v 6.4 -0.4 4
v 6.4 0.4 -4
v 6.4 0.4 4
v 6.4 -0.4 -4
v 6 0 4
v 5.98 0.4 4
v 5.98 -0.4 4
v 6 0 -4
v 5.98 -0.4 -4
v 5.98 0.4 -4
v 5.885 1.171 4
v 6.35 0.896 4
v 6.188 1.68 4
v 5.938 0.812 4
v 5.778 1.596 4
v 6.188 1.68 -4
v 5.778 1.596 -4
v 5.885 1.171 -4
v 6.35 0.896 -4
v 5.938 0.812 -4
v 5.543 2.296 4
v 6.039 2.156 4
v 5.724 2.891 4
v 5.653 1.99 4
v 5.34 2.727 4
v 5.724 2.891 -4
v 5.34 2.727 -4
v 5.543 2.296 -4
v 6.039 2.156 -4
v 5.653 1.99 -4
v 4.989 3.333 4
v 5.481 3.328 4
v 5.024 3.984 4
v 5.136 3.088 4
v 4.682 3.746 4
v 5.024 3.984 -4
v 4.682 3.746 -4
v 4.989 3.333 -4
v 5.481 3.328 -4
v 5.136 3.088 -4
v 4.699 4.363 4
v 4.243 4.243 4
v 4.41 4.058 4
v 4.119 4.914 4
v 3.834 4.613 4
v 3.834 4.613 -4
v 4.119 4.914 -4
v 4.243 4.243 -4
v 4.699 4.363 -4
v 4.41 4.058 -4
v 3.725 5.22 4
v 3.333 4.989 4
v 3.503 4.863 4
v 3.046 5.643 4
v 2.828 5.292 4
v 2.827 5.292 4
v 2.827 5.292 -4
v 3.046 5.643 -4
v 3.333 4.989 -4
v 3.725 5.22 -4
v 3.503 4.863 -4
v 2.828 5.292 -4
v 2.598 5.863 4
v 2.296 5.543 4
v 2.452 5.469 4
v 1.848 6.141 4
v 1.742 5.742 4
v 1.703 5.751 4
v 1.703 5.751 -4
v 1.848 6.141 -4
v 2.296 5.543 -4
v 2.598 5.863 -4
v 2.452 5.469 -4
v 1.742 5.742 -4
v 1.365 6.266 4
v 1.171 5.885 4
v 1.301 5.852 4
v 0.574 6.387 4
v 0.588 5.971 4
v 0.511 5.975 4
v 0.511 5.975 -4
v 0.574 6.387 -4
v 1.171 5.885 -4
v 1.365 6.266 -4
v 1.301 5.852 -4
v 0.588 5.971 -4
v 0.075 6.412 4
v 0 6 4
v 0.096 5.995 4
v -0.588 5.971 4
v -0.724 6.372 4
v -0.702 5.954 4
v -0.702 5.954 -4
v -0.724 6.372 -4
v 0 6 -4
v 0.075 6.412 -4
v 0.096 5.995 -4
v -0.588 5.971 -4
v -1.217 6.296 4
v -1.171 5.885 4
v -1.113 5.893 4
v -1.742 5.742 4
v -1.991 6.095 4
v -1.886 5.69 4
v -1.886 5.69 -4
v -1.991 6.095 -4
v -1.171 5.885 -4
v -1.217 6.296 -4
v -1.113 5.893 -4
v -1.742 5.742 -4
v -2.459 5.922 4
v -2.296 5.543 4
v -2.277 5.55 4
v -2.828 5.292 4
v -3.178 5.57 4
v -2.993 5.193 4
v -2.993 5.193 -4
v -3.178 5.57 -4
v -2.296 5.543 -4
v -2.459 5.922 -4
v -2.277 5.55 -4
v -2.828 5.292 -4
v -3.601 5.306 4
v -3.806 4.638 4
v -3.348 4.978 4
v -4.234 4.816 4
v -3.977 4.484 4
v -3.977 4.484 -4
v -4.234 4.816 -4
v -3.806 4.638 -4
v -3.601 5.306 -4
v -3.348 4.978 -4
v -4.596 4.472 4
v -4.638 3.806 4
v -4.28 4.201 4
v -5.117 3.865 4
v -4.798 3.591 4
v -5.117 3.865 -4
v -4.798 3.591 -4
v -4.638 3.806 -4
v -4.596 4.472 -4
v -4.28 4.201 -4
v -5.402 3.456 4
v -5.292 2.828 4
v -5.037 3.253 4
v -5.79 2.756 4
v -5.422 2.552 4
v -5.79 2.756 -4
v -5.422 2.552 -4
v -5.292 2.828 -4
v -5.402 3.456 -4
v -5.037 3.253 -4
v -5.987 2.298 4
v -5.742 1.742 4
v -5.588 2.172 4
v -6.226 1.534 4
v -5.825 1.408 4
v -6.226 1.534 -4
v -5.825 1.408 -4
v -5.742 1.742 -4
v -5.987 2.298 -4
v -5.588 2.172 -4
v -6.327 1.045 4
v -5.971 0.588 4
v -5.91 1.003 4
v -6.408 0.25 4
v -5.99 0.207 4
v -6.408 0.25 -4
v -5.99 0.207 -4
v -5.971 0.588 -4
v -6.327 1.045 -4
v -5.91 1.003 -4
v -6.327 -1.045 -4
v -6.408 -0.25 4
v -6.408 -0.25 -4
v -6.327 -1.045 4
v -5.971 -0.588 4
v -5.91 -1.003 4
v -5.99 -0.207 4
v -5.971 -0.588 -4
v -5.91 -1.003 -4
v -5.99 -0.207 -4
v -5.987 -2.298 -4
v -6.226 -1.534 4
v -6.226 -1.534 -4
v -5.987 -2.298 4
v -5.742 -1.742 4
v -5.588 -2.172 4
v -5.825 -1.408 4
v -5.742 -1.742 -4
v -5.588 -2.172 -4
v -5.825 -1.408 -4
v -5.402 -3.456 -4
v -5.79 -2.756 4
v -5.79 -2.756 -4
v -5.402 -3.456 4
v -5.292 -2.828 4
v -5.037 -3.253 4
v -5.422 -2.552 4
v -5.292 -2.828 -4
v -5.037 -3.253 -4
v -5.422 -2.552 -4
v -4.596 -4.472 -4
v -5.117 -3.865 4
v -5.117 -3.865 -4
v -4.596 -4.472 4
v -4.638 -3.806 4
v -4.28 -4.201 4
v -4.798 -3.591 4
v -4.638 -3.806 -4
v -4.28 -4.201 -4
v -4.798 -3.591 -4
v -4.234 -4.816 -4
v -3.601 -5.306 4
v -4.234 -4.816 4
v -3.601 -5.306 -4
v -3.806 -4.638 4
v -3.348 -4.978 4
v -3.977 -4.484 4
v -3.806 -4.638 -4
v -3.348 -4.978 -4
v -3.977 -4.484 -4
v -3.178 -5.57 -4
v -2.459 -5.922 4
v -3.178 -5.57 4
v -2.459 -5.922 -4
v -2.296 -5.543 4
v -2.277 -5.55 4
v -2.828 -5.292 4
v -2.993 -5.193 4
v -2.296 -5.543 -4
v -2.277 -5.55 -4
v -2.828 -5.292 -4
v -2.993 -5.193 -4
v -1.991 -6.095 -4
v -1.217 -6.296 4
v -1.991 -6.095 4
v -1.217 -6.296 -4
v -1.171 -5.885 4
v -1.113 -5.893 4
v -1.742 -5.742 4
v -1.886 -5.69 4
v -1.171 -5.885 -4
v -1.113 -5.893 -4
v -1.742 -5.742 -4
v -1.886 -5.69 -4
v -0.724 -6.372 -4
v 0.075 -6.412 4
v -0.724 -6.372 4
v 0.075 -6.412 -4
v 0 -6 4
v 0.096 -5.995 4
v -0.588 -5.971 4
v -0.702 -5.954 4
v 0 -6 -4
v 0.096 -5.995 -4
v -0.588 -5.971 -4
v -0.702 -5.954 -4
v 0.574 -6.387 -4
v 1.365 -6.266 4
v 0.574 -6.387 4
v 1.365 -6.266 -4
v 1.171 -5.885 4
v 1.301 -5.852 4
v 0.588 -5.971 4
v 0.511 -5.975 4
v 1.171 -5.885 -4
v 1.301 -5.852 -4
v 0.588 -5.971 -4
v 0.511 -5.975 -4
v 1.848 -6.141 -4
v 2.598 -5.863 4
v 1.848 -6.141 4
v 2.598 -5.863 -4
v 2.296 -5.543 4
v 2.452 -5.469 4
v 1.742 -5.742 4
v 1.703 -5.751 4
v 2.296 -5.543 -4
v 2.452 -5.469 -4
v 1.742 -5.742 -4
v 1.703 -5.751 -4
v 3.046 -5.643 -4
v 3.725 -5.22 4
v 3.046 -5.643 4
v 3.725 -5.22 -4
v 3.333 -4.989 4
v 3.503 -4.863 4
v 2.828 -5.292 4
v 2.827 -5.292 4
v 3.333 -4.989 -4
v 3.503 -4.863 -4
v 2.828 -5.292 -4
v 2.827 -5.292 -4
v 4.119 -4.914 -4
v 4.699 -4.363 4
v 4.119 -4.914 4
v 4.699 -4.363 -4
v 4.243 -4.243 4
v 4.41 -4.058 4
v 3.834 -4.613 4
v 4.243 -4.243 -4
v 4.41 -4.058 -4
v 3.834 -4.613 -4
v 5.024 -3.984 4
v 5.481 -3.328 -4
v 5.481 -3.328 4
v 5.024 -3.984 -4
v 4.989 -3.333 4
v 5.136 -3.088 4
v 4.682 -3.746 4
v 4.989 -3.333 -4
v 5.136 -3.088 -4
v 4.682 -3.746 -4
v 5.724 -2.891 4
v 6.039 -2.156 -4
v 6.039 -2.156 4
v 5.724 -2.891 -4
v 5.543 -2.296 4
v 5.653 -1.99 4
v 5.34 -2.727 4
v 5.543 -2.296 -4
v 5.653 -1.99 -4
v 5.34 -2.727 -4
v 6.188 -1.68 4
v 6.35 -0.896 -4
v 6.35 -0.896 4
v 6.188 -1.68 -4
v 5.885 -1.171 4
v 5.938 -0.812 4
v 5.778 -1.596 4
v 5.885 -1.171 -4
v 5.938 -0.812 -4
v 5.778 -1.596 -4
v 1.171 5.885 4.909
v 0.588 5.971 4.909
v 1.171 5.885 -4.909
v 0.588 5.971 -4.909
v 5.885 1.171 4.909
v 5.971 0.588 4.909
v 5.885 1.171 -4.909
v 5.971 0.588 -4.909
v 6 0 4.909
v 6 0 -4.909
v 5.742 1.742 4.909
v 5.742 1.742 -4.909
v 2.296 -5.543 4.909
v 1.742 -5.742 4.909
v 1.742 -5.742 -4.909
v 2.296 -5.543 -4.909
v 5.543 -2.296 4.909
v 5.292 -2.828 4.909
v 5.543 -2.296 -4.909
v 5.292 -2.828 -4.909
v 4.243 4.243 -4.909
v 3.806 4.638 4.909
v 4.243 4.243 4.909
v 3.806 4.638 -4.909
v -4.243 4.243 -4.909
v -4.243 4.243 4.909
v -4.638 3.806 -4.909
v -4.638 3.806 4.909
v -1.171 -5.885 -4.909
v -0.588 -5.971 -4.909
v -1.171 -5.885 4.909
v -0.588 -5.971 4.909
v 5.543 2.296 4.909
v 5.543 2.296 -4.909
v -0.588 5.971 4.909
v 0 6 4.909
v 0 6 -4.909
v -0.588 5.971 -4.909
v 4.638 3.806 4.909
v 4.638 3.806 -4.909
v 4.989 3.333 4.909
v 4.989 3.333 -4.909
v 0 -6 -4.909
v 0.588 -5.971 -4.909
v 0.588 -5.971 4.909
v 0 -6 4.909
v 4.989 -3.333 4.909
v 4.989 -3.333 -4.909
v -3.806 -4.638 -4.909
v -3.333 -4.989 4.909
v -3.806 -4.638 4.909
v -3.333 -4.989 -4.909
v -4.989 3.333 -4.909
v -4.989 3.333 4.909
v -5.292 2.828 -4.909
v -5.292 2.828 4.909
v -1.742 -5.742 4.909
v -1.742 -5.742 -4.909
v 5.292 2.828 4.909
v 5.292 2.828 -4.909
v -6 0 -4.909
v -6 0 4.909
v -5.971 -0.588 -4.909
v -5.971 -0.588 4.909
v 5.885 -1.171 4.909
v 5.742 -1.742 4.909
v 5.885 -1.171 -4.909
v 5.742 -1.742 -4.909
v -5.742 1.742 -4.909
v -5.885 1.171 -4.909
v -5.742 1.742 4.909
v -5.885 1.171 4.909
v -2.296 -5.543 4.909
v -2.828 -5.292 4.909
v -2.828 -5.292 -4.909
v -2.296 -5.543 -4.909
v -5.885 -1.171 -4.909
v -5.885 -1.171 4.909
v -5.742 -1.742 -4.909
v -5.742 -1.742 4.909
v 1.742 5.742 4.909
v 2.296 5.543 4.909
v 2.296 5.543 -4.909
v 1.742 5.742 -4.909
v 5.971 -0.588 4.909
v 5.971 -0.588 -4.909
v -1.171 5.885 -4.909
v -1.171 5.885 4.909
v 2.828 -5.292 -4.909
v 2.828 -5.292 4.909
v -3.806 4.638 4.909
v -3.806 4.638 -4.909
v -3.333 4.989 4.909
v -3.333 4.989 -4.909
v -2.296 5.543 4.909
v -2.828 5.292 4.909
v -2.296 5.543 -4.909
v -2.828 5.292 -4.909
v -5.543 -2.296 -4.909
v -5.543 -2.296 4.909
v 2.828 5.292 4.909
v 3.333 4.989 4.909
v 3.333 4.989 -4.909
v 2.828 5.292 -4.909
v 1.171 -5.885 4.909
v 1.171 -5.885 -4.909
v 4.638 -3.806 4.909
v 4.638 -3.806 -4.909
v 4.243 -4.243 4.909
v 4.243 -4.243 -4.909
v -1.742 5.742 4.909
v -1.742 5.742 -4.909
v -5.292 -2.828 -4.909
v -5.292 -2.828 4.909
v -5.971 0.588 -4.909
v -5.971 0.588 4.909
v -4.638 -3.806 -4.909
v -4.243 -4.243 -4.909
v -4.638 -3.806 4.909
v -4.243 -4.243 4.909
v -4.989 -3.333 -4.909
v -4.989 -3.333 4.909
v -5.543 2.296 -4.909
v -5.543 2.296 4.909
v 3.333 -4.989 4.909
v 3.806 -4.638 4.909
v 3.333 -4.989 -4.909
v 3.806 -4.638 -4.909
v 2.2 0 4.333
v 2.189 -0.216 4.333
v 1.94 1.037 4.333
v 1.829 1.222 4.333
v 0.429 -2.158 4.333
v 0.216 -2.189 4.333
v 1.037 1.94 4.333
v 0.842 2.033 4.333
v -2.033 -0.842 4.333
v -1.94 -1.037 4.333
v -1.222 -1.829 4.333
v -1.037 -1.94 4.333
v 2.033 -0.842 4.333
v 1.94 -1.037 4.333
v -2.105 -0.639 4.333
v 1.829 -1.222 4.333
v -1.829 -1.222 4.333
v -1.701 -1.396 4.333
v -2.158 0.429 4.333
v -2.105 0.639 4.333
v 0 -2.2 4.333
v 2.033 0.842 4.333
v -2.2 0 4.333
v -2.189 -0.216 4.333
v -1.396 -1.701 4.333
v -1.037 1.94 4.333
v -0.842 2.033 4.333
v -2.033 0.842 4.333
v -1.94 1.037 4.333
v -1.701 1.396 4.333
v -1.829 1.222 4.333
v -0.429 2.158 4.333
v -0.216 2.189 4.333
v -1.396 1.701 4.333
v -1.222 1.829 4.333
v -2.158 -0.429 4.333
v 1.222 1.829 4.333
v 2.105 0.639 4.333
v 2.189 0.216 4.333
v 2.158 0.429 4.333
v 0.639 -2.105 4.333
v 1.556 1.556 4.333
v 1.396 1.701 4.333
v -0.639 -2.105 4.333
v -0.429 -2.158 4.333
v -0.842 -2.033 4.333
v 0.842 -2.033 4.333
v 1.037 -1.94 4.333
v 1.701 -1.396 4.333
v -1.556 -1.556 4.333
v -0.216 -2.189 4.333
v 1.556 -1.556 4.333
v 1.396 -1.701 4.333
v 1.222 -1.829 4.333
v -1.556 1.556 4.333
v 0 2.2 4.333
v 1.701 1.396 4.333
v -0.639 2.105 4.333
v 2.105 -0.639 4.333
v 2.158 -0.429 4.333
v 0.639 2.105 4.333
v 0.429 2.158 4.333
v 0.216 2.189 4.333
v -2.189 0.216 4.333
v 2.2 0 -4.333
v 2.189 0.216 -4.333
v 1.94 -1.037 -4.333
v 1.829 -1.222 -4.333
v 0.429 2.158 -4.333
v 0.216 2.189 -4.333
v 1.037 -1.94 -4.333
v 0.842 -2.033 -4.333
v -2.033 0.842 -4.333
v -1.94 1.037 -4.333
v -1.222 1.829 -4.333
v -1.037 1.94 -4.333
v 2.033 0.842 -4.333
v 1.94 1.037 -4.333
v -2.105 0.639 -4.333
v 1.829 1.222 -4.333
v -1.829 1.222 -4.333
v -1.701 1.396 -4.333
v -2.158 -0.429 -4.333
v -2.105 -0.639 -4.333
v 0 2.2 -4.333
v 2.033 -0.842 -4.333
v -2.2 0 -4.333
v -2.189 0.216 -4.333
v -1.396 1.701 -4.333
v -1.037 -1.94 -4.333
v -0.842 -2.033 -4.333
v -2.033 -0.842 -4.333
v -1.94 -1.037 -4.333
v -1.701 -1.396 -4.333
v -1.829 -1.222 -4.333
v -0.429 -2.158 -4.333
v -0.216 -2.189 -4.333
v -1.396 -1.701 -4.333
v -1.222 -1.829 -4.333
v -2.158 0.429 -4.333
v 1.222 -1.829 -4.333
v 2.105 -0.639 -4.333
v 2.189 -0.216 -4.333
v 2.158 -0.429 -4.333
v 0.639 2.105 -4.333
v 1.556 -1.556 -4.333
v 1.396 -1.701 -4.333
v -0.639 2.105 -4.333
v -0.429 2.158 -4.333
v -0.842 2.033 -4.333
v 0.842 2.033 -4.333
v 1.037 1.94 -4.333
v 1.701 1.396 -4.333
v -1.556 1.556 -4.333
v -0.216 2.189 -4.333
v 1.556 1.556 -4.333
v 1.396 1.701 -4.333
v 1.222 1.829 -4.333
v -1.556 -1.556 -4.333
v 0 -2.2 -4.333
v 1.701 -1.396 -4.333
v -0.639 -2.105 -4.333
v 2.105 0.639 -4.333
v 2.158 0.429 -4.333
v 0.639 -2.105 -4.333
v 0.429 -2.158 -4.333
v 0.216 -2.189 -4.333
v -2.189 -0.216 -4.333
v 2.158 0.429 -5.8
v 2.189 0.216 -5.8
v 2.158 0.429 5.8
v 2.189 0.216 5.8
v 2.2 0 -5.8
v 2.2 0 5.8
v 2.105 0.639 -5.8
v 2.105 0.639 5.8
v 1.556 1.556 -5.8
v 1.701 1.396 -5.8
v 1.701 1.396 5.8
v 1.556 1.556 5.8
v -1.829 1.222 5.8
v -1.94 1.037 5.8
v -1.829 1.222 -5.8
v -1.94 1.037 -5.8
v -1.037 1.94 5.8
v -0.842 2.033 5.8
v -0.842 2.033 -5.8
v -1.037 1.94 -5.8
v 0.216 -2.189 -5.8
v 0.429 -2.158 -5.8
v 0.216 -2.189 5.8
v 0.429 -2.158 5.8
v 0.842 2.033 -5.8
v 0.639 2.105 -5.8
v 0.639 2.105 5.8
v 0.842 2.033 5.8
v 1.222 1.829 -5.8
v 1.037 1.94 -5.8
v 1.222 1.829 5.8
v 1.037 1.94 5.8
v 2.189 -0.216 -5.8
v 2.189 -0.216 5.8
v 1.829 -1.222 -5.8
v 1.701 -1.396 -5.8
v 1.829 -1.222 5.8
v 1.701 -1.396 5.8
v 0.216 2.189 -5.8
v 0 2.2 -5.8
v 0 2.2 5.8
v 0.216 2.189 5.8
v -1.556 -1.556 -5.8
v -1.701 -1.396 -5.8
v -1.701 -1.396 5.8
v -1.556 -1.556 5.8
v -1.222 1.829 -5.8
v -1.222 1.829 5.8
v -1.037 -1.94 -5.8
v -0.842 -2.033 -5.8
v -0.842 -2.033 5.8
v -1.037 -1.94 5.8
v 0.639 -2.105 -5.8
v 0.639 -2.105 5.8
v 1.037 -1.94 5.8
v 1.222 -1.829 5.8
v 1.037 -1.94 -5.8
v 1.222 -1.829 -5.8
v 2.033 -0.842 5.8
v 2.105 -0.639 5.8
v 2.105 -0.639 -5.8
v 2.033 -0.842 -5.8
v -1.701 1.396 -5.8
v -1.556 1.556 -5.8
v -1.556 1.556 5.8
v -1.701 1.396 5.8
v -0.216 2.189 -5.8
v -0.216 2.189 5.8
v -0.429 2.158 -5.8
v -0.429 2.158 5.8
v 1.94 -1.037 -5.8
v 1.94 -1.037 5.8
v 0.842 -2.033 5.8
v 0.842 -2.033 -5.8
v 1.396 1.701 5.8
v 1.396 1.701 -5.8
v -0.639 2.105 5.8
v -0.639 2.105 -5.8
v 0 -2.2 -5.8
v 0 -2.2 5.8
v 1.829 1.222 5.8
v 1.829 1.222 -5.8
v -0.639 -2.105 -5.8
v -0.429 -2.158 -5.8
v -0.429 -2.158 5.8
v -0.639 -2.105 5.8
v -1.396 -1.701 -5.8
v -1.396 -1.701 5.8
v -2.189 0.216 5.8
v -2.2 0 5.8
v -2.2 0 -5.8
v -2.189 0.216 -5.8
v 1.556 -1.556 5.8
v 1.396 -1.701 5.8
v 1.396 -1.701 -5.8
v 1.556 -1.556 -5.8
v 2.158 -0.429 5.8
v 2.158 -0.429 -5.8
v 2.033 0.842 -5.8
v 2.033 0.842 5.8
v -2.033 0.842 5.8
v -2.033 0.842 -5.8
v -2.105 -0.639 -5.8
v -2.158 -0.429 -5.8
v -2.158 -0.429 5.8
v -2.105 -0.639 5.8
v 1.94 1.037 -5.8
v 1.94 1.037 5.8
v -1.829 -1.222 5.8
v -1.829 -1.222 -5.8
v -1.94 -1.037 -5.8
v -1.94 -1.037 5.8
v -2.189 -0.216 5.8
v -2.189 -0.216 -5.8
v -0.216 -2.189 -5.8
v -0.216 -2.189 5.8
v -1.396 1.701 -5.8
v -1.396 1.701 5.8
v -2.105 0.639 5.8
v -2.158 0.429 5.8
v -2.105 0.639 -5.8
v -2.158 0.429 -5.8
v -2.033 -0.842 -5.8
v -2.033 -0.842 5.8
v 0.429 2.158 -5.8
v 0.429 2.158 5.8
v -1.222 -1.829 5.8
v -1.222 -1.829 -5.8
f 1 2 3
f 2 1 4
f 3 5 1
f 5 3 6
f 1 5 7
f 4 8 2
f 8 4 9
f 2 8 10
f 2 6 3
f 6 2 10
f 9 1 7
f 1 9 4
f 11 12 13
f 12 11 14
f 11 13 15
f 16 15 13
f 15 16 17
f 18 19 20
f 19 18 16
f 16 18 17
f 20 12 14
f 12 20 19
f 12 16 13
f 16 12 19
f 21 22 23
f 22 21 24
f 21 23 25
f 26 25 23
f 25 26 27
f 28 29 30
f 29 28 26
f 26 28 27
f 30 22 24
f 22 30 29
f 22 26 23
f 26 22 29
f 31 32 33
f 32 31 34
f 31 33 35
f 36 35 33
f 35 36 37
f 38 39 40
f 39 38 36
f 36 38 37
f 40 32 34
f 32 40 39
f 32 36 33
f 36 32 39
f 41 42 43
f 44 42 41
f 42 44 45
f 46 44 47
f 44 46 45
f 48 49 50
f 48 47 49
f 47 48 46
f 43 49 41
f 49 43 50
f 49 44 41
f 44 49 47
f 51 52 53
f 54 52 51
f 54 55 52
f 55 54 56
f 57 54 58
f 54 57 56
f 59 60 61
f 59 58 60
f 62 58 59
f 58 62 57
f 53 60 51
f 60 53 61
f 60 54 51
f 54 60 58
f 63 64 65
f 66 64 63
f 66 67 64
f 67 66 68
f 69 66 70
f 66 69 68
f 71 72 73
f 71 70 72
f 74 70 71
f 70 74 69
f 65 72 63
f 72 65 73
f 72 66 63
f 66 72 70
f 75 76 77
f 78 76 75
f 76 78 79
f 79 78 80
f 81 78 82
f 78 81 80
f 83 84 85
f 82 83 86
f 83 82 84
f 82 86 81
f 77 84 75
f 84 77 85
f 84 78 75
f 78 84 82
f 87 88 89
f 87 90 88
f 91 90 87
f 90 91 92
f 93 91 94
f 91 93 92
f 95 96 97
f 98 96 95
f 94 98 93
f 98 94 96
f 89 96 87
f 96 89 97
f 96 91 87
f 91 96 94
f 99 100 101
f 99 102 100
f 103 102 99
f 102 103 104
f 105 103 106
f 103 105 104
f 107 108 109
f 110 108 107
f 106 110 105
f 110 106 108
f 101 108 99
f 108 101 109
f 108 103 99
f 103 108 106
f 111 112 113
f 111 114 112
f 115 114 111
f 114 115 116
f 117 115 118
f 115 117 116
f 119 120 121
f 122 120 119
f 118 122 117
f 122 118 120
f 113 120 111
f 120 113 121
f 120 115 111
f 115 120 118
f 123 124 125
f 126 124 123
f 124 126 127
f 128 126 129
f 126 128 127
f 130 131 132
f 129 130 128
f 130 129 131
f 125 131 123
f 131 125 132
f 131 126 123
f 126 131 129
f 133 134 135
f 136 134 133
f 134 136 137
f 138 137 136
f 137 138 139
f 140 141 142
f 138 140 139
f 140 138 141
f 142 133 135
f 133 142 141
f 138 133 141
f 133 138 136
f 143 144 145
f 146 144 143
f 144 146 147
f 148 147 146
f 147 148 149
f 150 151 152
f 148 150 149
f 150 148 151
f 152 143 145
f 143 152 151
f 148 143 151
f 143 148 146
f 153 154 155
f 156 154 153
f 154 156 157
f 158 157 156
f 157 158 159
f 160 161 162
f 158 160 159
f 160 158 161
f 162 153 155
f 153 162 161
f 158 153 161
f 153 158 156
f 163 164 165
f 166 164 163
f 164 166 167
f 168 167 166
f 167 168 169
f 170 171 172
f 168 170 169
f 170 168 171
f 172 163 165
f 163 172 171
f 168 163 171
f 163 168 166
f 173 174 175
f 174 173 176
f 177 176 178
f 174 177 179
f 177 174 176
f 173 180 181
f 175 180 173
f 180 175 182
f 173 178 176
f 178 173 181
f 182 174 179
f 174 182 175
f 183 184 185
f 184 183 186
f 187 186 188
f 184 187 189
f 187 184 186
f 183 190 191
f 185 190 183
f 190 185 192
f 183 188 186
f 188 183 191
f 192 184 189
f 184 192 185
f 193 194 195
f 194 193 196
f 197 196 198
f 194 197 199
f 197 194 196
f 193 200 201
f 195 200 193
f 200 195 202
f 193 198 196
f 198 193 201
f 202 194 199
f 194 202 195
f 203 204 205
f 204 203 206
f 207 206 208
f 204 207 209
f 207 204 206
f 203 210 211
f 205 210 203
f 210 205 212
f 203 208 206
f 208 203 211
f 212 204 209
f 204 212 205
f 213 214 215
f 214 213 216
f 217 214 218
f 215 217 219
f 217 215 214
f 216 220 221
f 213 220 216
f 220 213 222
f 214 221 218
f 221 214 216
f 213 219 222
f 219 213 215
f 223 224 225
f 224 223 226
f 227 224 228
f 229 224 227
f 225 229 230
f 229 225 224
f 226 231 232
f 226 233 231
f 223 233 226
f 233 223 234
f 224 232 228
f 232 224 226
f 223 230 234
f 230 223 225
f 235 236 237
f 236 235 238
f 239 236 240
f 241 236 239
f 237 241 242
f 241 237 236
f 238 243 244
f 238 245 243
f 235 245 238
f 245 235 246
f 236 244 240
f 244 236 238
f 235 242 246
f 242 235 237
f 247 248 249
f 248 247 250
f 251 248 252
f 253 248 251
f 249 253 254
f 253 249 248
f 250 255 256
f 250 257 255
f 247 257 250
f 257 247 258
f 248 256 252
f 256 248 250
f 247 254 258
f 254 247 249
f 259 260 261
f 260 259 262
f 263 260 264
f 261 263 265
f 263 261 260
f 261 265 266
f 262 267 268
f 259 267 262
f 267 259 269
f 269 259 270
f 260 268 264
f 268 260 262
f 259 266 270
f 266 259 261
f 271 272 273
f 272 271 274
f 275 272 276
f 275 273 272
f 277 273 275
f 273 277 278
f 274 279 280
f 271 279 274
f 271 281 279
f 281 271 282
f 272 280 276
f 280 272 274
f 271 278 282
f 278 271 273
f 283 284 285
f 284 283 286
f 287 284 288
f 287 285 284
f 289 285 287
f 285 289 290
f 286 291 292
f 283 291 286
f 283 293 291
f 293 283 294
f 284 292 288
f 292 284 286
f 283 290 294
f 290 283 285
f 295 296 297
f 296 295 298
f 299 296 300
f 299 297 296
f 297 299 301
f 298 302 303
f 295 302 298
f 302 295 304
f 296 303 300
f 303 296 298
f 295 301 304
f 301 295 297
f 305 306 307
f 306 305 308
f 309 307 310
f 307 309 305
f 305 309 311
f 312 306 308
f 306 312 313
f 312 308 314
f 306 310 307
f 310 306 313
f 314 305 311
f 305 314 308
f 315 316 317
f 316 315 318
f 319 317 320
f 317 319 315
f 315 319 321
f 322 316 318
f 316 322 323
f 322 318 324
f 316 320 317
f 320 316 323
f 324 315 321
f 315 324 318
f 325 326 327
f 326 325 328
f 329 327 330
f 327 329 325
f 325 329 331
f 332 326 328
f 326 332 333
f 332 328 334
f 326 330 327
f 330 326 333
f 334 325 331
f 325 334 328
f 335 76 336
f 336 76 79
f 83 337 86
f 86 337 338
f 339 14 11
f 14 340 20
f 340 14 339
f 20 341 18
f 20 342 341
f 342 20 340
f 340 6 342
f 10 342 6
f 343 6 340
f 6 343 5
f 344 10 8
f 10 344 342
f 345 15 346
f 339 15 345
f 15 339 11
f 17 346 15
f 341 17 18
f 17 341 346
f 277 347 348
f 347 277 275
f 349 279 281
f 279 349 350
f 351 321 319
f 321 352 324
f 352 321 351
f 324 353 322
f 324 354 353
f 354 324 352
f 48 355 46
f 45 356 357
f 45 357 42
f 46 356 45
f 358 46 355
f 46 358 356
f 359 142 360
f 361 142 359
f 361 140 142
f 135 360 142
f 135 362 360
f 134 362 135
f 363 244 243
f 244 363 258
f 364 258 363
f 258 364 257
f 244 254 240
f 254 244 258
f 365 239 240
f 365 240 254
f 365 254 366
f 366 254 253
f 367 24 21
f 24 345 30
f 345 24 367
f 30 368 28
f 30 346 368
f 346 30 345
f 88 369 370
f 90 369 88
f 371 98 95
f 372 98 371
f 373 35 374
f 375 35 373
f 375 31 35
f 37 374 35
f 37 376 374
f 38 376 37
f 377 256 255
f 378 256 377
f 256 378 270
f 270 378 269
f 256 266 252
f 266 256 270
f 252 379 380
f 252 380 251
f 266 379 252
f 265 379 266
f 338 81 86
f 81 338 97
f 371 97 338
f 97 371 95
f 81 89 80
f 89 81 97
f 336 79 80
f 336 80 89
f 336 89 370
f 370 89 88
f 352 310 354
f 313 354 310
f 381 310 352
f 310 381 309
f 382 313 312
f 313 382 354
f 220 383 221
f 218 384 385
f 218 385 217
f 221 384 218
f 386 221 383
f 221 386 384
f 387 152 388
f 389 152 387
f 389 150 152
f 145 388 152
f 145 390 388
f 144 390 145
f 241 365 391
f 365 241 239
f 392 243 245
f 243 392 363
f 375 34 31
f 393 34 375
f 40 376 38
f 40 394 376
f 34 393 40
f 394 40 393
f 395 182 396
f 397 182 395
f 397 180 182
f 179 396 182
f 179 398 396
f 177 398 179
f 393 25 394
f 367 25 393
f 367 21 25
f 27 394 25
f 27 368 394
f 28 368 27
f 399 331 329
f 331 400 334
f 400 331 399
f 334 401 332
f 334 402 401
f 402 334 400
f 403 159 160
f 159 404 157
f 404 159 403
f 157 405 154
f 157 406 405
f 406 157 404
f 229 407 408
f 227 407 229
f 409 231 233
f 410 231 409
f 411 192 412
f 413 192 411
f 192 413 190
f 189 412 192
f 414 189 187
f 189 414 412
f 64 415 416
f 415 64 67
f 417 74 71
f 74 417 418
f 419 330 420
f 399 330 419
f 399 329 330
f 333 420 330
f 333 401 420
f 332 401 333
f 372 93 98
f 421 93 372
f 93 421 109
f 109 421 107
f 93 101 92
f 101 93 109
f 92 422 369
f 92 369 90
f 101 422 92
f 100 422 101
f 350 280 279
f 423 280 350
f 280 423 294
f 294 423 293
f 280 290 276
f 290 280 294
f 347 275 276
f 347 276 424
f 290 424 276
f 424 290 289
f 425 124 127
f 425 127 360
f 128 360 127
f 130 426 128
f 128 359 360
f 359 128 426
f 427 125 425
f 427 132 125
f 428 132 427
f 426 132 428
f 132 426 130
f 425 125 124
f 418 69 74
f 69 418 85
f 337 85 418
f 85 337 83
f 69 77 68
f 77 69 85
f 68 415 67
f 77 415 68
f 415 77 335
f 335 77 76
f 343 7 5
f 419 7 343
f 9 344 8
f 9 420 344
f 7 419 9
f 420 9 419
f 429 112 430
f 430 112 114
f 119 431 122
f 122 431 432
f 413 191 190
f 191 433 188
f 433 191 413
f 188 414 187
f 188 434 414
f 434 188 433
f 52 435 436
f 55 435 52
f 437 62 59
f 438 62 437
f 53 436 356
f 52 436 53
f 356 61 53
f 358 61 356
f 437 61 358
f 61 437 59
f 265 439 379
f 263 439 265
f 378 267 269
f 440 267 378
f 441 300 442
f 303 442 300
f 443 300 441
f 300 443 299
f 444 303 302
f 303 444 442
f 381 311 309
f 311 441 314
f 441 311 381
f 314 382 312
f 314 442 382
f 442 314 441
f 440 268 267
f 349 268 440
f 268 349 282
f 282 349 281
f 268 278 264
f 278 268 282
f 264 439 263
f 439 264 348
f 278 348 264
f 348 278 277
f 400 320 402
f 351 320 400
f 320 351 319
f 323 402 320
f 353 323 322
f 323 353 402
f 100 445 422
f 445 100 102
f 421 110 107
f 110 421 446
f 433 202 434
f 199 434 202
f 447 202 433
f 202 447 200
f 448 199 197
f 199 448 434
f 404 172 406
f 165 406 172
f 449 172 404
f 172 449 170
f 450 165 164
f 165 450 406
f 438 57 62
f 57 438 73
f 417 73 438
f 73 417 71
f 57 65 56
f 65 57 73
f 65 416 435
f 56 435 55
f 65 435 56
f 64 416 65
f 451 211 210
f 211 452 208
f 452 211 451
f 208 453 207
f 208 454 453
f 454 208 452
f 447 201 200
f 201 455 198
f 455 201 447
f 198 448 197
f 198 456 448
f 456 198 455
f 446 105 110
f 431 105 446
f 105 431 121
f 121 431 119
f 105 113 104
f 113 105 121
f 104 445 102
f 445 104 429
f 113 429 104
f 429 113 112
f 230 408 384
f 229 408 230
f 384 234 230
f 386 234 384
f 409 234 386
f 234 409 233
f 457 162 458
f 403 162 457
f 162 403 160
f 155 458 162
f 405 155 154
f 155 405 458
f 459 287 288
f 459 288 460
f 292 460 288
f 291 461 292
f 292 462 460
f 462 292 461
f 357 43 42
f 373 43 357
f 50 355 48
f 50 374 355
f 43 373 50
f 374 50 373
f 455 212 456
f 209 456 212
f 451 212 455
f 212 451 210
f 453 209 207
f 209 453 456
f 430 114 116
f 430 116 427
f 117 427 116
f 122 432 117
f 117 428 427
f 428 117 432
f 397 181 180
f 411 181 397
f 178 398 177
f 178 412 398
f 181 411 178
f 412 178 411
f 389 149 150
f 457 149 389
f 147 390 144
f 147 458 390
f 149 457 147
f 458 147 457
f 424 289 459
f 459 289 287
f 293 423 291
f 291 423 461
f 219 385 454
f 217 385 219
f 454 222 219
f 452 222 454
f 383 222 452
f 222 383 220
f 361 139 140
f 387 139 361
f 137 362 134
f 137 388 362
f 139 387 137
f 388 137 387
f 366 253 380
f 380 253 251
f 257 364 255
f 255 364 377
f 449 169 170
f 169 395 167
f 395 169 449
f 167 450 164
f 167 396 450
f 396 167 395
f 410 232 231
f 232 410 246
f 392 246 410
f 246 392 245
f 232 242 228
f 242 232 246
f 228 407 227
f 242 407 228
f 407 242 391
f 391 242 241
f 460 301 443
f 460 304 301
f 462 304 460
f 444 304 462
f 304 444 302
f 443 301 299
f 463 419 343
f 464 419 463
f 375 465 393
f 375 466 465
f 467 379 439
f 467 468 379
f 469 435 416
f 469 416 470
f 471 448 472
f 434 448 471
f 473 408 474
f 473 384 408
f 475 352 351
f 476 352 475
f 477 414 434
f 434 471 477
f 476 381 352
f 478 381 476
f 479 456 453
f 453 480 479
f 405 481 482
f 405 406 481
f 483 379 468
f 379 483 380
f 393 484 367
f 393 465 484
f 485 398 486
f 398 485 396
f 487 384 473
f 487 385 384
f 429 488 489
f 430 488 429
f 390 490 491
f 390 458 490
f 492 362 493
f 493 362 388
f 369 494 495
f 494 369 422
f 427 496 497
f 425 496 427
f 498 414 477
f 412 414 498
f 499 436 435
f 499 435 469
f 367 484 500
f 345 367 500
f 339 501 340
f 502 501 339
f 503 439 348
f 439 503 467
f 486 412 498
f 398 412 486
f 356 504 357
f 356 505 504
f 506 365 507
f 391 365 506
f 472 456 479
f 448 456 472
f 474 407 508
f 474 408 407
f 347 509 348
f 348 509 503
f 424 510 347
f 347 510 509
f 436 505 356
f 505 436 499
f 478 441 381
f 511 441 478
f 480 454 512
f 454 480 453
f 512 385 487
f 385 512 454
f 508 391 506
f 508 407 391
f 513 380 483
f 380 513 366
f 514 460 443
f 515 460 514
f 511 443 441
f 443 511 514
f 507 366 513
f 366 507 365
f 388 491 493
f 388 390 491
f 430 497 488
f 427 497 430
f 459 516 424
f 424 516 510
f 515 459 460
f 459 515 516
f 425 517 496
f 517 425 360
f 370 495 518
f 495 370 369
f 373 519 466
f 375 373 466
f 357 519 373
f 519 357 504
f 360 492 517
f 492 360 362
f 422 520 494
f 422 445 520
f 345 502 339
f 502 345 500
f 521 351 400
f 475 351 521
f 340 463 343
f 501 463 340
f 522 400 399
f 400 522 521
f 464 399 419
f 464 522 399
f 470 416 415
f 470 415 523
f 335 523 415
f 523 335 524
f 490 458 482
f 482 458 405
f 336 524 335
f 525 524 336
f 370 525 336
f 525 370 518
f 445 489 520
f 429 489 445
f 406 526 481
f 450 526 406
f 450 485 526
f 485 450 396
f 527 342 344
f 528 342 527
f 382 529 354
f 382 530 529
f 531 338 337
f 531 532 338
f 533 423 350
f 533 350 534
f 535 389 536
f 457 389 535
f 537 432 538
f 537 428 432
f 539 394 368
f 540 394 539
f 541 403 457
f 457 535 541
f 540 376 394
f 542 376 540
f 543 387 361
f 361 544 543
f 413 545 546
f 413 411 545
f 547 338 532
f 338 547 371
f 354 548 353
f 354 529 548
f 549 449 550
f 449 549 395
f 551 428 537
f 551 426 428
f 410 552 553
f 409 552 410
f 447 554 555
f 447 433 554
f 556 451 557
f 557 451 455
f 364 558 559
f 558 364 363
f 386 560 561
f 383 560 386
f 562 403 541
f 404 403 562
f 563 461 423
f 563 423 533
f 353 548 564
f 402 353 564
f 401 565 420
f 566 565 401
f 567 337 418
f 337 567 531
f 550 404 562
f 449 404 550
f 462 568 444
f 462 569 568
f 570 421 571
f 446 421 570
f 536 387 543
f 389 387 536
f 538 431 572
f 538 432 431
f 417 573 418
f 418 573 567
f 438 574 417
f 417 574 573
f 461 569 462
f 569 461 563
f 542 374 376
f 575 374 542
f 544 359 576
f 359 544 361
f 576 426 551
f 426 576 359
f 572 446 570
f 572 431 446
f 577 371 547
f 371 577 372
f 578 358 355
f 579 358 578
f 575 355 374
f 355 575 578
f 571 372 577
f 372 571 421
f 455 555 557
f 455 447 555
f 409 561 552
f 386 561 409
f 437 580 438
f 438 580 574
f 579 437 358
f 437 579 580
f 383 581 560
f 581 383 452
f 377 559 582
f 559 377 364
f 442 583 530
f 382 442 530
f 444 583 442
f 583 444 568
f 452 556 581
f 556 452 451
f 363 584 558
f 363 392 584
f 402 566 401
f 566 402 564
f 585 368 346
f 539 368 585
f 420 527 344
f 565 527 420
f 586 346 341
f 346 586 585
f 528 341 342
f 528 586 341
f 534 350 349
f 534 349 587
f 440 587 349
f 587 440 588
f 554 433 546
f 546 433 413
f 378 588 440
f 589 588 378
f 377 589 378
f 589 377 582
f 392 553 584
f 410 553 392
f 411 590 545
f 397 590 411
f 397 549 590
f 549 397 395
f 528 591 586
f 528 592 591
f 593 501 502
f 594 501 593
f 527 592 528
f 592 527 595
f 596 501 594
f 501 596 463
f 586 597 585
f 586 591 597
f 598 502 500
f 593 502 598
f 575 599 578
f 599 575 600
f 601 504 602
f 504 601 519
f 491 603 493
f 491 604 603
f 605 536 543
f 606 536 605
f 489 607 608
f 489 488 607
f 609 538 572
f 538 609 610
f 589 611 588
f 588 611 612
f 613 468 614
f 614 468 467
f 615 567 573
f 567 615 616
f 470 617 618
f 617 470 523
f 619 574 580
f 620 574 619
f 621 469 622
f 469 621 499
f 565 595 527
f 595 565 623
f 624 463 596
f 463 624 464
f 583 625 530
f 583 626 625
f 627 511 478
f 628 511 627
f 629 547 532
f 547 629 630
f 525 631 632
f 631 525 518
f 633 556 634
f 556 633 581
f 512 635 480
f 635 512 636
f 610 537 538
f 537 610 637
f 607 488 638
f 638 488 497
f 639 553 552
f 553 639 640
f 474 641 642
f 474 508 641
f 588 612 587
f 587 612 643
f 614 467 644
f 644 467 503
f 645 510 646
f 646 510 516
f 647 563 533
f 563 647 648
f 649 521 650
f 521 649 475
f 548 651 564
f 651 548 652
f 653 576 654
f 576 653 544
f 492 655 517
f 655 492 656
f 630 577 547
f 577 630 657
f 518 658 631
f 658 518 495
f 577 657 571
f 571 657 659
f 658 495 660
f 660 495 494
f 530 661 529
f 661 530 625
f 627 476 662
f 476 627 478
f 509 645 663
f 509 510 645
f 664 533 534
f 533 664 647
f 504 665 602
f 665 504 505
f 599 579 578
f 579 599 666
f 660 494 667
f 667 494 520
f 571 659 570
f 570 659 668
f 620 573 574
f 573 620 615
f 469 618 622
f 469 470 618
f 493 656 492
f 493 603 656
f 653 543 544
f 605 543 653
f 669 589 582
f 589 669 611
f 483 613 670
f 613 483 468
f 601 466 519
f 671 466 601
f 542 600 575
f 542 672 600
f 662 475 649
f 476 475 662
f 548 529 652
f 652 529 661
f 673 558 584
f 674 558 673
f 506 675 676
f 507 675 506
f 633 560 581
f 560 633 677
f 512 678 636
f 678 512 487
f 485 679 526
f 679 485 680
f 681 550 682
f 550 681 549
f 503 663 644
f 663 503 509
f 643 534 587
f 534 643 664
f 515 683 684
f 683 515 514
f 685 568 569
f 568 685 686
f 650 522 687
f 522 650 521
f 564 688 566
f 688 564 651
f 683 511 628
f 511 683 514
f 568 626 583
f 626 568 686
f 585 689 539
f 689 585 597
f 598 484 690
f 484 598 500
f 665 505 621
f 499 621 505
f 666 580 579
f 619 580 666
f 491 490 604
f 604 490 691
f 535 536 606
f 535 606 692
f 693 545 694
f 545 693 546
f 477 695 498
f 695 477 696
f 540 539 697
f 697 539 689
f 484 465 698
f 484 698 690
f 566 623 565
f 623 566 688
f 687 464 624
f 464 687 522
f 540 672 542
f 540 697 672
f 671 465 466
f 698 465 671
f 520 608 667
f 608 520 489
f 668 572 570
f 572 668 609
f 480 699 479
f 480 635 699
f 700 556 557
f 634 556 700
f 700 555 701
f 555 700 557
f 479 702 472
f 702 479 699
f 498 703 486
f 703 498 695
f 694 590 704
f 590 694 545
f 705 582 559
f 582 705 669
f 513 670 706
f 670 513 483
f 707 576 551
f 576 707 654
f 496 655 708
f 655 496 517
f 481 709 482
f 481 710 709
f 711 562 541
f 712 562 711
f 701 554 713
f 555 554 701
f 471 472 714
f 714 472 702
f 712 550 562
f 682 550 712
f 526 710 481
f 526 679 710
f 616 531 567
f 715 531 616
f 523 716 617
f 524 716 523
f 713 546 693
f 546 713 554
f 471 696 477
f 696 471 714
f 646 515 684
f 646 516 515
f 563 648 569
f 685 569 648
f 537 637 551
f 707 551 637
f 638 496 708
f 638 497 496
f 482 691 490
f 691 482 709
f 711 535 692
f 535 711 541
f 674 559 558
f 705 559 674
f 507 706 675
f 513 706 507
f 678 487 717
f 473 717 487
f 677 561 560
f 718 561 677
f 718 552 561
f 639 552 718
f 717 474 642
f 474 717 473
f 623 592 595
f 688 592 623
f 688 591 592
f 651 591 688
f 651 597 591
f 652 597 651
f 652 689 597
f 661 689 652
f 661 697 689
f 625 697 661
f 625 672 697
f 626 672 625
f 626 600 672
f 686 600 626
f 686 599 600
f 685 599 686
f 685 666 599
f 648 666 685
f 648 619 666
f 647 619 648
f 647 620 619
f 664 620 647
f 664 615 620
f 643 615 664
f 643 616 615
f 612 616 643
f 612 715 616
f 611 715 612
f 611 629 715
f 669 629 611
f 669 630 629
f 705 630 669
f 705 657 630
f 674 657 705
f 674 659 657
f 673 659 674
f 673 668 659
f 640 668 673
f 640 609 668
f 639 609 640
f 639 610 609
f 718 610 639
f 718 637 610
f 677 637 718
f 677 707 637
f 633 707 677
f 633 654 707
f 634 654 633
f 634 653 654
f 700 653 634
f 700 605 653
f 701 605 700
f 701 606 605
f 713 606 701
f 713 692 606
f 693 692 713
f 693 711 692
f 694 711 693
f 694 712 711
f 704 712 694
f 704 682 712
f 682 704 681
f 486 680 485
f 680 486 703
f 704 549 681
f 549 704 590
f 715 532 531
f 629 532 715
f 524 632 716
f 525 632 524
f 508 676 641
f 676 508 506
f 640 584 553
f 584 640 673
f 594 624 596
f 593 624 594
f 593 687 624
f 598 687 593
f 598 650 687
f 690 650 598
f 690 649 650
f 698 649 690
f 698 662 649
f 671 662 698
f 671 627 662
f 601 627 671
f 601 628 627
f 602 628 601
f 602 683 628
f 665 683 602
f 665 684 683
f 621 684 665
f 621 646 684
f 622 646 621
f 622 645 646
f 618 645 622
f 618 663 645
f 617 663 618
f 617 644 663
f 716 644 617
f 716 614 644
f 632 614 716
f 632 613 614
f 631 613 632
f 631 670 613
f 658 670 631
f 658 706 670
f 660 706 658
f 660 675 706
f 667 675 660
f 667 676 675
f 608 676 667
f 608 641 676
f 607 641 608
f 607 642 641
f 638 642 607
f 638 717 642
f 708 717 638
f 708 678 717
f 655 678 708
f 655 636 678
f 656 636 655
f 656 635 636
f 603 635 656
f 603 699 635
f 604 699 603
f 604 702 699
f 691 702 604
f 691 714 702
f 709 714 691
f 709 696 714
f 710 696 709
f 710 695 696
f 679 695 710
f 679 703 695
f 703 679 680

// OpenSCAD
// Parameters
outer_diameter_mm = 12; //[6:24:0.1]
length_mm = 10; //[5:20:0.1]
screw_diameter_mm = 5; //[2.5:10:0.1]
thread_pitch_mm = 0.8; //[0.4:1.6:0.05]
tolerance_mm = 0.2; //[0.05:0.6:0.05]
pilot_hole_diameter_mm = 4.2; //[3.5:5:0.05]
knurl_depth_mm = 0.6; //[0.3:1.2:0.05]
knurl_pitch_mm = 1.2; //[0.6:2.4:0.1]
rib_width_mm = 0.8; //[0.4:1.6:0.05]
rib_height_mm = 8; //[4:16:0.1]
top_chamfer_mm = 1; //[0.5:2:0.1]
bottom_chamfer_mm = 1; //[0.5:2:0.1]
overlap_mm = 0.8; //[0.5:2:0.1]

// Threaded Insert - complete geometry
module threaded_insert() {
  color("Brass") {
    // Insert Body
    difference() {
      union() {
        // Main body
        translate([0, 0, 0])
          cylinder(r=outer_diameter_mm/2, h=length_mm, center=true, $fn=64);
        
        // Knurl ribs
        outer_knurl_or_ribs();
      }
      
      // Lead-in chamfer
      translate([0, 0, length_mm/2 - top_chamfer_mm/2])
        rotate([180, 0, 0])
        cylinder(r1=outer_diameter_mm/2 + knurl_depth_mm, r2=0, h=top_chamfer_mm, center=true, $fn=64);
      
      // Installation-end chamfer
      translate([0, 0, -length_mm/2 + bottom_chamfer_mm/2])
        cylinder(r1=outer_diameter_mm/2 + knurl_depth_mm, r2=0, h=bottom_chamfer_mm, center=true, $fn=64);
    }
    
    // Internal thread or tap bore
    translate([0, 0, 0])
      cylinder(r=(pilot_hole_diameter_mm + tolerance_mm)/2, h=length_mm + 2*overlap_mm, center=true, $fn=64);
  }
}

// Knurl ribs
module outer_knurl_or_ribs() {
  union() {
    for (i = [0 : floor((3.141592653589793 * outer_diameter_mm) / knurl_pitch_mm) - 1]) {
      rotate([0, 0, i * 360 / floor((3.141592653589793 * outer_diameter_mm) / knurl_pitch_mm)])
        translate([outer_diameter_mm/2 + knurl_depth_mm - overlap_mm, 0, 0])
        cube([knurl_depth_mm*2, rib_width_mm, rib_height_mm], center=true);
    }
  }
}

// Assembly
module assembly() {
  threaded_insert();
}

assembly();
